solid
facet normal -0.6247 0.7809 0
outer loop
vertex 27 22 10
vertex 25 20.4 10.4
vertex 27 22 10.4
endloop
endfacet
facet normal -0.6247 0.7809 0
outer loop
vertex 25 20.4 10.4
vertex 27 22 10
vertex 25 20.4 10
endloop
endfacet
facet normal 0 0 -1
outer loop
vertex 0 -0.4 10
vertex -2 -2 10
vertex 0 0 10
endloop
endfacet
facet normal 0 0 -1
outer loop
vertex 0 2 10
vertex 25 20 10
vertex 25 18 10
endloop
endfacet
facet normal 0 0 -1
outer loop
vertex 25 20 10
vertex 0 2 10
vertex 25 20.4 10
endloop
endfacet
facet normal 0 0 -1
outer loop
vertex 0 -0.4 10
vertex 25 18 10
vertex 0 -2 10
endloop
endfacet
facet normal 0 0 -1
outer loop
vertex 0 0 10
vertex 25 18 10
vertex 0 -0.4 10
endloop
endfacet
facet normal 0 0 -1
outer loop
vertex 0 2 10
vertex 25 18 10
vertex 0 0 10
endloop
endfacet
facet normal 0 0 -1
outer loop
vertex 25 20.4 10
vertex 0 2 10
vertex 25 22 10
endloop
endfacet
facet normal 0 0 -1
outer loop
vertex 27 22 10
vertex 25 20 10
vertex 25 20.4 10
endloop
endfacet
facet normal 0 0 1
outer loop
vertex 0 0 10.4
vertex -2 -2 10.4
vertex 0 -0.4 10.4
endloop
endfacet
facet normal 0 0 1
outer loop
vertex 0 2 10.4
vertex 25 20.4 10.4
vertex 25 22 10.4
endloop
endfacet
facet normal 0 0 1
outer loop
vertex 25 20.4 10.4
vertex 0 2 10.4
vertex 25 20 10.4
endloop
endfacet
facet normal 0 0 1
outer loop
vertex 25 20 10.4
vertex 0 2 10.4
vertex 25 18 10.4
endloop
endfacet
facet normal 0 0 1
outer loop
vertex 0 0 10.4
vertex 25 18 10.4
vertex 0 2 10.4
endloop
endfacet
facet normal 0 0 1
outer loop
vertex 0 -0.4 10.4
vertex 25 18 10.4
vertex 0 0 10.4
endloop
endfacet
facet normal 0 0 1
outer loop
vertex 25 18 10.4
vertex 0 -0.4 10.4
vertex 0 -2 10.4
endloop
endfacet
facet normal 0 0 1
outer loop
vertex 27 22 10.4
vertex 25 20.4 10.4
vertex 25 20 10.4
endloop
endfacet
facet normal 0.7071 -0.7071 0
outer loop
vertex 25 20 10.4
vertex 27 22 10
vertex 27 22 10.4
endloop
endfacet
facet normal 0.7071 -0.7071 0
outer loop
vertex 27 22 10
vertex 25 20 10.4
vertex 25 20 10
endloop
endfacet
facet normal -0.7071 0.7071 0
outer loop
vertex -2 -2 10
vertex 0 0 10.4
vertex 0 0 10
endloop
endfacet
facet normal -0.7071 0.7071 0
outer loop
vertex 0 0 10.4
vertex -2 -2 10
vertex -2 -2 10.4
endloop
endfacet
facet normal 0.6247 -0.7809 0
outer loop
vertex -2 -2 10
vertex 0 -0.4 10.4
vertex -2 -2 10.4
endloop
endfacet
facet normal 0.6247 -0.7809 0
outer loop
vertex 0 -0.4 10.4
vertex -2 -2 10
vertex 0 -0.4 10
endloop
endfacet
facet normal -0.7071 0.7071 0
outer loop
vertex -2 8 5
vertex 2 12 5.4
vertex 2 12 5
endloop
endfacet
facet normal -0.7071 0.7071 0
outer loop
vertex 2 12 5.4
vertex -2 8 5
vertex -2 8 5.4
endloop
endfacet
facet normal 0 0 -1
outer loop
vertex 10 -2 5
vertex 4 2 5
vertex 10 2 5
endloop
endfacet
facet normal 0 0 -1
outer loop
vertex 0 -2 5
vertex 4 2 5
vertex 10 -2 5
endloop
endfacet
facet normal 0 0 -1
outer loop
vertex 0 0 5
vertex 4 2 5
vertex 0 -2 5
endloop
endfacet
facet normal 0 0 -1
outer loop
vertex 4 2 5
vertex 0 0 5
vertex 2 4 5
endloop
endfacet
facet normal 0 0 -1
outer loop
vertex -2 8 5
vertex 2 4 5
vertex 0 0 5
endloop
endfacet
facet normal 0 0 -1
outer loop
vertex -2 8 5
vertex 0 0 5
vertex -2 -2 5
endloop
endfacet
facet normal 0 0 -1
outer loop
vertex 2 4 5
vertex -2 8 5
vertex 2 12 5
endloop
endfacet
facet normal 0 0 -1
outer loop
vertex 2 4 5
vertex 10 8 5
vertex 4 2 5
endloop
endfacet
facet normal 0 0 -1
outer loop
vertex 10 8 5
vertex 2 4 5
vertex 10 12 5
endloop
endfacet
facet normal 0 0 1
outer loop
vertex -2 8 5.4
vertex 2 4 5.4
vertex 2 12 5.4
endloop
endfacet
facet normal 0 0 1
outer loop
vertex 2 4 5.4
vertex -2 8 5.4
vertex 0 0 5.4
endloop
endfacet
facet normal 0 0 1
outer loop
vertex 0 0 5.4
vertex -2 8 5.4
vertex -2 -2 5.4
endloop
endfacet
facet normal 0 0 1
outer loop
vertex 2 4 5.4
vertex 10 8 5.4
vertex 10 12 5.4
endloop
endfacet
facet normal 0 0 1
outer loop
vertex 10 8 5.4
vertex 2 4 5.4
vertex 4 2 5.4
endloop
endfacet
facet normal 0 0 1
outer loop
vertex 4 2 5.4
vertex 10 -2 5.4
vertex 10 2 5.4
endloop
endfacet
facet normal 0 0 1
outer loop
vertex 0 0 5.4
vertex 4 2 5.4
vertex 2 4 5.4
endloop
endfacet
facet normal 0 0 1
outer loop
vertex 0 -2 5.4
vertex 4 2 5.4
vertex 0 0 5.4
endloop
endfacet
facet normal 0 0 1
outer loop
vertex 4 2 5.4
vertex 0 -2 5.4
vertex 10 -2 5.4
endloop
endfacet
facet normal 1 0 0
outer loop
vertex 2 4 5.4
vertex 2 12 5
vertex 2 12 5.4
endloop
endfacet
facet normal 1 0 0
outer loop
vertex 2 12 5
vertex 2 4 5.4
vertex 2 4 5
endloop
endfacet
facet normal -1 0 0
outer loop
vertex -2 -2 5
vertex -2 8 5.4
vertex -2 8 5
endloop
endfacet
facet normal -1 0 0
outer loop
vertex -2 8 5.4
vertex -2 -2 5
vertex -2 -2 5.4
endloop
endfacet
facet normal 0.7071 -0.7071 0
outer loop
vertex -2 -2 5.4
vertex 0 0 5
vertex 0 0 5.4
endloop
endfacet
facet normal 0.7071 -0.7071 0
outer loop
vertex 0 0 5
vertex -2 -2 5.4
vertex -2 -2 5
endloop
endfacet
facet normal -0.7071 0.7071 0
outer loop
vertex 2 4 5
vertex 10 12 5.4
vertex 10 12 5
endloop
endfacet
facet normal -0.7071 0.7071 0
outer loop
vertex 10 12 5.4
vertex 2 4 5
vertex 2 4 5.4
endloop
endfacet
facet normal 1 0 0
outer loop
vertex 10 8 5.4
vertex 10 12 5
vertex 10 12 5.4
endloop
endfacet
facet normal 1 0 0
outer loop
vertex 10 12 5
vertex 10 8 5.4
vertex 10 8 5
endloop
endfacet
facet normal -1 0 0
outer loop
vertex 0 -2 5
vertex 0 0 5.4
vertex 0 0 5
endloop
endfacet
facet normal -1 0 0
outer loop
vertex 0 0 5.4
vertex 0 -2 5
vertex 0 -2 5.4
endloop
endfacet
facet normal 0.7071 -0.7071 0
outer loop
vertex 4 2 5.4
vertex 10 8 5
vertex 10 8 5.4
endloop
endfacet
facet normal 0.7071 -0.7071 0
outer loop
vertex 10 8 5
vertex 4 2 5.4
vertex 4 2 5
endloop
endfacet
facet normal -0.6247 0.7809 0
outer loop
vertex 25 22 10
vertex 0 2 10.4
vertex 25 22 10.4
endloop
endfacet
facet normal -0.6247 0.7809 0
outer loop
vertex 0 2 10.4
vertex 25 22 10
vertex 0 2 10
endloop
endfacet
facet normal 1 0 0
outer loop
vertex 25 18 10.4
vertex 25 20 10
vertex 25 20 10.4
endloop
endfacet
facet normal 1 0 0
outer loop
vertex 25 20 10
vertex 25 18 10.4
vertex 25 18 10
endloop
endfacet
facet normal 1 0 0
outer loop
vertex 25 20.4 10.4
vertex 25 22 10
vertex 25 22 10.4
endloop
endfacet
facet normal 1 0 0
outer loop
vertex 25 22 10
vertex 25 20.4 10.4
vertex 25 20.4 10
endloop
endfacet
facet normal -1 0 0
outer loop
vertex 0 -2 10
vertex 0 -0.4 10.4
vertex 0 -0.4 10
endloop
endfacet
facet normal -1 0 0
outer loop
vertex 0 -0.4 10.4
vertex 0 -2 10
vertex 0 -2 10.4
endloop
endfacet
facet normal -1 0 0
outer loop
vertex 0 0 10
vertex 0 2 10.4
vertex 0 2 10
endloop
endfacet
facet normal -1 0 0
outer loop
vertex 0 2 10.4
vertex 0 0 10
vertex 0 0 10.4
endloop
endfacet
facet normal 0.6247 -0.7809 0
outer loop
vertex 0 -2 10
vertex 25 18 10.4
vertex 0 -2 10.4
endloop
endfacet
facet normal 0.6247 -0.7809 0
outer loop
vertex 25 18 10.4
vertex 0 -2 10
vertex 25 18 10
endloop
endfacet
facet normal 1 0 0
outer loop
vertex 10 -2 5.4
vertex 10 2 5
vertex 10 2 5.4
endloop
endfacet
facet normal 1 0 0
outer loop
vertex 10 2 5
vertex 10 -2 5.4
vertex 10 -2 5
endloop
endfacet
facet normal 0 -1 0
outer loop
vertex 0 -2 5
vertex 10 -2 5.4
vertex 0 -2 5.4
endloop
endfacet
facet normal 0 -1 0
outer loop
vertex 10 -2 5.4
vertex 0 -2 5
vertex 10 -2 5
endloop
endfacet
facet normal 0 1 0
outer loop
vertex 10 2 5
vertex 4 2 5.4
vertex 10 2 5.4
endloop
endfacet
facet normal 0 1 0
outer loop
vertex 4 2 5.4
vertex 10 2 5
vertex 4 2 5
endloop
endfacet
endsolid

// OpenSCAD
//bridge_primitive test
$fa = 50;
$fn = 50;

x2 = 0; //p1.x
y2 = 0; //p1.y
x3 = 10; //p2.x
y3 = 10; //p2.y
delta = 2;
x4 = 5;
y4 = 0;
bridge_height = 5; //bridge_height
bridge_height1 = 10;
height = 0.4;

//translate([0, 0, bridge_height])
//linear_extrude(.4)
//polygon(points = [[x0+delta, y0+delta], [x0-delta, y0-delta], [x1-delta, y1-delta], [x1+delta, y1+delta]]);
//polygon([[0,0],[100,0],[130,50],[30,50]]);
//polygon(points = [[3, 3], [-3, -3], [7, 7], [13, 13]]);
//polygon(points = [[x0+delta, y0], [x0-delta, y0], [x1-delta, y1], [x1+delta, y1]]);
/*
translate([0, 0, bridge_height1])
linear_extrude(.4)
polygon(points = [[x2+delta, y2], [x2-delta, y2], [x4-delta, y4], [x4+delta, y4]]);*/

module bridge(x0, y0, x1, y1, z_height)
{
    translate([0, 0, z_height])
    linear_extrude(height)
    polygon(points = [[x0+delta, y0], [x0-delta, y0], [x1-delta, y1], [x1+delta, y1]]);
}
%bridge(x2, y2, x3, y3, bridge_height);
%bridge(0, 0, 25, 20, 10);
%bridge(0, 0, 0, 10, 5);
//works unless bridge is horizontal...

//don't like this one...cut it
module bridge1(x0, y0, x1, y1, z_height)
{
    translate([0, 0, z_height])
    linear_extrude(height)
    polygon(points = [[x0+delta, y0+delta], [x0-delta, y0-delta], [x1-delta, y1-delta], [x1+delta, y1+delta]]);
}
bridge1(x2, y2, x3, y3, bridge_height);
bridge1(0, 0, 25, 20, 10);
bridge1(0, 0, 0, 10, 5);

//works unless bridge is vertical...
module bridge2(x0, y0, x1, y1, z_height)
{
    translate([0, 0, z_height])
    linear_extrude(height)
    polygon(points = [[x0, y0+delta], [x0, y0-delta], [x1, y1-delta], [x1, y1+delta]]);
}
bridge2(x2, y2, x3, y3, bridge_height);
bridge2(0, 0, 25, 20, 10);
bridge2(0, 0, 10, 0, 5);
